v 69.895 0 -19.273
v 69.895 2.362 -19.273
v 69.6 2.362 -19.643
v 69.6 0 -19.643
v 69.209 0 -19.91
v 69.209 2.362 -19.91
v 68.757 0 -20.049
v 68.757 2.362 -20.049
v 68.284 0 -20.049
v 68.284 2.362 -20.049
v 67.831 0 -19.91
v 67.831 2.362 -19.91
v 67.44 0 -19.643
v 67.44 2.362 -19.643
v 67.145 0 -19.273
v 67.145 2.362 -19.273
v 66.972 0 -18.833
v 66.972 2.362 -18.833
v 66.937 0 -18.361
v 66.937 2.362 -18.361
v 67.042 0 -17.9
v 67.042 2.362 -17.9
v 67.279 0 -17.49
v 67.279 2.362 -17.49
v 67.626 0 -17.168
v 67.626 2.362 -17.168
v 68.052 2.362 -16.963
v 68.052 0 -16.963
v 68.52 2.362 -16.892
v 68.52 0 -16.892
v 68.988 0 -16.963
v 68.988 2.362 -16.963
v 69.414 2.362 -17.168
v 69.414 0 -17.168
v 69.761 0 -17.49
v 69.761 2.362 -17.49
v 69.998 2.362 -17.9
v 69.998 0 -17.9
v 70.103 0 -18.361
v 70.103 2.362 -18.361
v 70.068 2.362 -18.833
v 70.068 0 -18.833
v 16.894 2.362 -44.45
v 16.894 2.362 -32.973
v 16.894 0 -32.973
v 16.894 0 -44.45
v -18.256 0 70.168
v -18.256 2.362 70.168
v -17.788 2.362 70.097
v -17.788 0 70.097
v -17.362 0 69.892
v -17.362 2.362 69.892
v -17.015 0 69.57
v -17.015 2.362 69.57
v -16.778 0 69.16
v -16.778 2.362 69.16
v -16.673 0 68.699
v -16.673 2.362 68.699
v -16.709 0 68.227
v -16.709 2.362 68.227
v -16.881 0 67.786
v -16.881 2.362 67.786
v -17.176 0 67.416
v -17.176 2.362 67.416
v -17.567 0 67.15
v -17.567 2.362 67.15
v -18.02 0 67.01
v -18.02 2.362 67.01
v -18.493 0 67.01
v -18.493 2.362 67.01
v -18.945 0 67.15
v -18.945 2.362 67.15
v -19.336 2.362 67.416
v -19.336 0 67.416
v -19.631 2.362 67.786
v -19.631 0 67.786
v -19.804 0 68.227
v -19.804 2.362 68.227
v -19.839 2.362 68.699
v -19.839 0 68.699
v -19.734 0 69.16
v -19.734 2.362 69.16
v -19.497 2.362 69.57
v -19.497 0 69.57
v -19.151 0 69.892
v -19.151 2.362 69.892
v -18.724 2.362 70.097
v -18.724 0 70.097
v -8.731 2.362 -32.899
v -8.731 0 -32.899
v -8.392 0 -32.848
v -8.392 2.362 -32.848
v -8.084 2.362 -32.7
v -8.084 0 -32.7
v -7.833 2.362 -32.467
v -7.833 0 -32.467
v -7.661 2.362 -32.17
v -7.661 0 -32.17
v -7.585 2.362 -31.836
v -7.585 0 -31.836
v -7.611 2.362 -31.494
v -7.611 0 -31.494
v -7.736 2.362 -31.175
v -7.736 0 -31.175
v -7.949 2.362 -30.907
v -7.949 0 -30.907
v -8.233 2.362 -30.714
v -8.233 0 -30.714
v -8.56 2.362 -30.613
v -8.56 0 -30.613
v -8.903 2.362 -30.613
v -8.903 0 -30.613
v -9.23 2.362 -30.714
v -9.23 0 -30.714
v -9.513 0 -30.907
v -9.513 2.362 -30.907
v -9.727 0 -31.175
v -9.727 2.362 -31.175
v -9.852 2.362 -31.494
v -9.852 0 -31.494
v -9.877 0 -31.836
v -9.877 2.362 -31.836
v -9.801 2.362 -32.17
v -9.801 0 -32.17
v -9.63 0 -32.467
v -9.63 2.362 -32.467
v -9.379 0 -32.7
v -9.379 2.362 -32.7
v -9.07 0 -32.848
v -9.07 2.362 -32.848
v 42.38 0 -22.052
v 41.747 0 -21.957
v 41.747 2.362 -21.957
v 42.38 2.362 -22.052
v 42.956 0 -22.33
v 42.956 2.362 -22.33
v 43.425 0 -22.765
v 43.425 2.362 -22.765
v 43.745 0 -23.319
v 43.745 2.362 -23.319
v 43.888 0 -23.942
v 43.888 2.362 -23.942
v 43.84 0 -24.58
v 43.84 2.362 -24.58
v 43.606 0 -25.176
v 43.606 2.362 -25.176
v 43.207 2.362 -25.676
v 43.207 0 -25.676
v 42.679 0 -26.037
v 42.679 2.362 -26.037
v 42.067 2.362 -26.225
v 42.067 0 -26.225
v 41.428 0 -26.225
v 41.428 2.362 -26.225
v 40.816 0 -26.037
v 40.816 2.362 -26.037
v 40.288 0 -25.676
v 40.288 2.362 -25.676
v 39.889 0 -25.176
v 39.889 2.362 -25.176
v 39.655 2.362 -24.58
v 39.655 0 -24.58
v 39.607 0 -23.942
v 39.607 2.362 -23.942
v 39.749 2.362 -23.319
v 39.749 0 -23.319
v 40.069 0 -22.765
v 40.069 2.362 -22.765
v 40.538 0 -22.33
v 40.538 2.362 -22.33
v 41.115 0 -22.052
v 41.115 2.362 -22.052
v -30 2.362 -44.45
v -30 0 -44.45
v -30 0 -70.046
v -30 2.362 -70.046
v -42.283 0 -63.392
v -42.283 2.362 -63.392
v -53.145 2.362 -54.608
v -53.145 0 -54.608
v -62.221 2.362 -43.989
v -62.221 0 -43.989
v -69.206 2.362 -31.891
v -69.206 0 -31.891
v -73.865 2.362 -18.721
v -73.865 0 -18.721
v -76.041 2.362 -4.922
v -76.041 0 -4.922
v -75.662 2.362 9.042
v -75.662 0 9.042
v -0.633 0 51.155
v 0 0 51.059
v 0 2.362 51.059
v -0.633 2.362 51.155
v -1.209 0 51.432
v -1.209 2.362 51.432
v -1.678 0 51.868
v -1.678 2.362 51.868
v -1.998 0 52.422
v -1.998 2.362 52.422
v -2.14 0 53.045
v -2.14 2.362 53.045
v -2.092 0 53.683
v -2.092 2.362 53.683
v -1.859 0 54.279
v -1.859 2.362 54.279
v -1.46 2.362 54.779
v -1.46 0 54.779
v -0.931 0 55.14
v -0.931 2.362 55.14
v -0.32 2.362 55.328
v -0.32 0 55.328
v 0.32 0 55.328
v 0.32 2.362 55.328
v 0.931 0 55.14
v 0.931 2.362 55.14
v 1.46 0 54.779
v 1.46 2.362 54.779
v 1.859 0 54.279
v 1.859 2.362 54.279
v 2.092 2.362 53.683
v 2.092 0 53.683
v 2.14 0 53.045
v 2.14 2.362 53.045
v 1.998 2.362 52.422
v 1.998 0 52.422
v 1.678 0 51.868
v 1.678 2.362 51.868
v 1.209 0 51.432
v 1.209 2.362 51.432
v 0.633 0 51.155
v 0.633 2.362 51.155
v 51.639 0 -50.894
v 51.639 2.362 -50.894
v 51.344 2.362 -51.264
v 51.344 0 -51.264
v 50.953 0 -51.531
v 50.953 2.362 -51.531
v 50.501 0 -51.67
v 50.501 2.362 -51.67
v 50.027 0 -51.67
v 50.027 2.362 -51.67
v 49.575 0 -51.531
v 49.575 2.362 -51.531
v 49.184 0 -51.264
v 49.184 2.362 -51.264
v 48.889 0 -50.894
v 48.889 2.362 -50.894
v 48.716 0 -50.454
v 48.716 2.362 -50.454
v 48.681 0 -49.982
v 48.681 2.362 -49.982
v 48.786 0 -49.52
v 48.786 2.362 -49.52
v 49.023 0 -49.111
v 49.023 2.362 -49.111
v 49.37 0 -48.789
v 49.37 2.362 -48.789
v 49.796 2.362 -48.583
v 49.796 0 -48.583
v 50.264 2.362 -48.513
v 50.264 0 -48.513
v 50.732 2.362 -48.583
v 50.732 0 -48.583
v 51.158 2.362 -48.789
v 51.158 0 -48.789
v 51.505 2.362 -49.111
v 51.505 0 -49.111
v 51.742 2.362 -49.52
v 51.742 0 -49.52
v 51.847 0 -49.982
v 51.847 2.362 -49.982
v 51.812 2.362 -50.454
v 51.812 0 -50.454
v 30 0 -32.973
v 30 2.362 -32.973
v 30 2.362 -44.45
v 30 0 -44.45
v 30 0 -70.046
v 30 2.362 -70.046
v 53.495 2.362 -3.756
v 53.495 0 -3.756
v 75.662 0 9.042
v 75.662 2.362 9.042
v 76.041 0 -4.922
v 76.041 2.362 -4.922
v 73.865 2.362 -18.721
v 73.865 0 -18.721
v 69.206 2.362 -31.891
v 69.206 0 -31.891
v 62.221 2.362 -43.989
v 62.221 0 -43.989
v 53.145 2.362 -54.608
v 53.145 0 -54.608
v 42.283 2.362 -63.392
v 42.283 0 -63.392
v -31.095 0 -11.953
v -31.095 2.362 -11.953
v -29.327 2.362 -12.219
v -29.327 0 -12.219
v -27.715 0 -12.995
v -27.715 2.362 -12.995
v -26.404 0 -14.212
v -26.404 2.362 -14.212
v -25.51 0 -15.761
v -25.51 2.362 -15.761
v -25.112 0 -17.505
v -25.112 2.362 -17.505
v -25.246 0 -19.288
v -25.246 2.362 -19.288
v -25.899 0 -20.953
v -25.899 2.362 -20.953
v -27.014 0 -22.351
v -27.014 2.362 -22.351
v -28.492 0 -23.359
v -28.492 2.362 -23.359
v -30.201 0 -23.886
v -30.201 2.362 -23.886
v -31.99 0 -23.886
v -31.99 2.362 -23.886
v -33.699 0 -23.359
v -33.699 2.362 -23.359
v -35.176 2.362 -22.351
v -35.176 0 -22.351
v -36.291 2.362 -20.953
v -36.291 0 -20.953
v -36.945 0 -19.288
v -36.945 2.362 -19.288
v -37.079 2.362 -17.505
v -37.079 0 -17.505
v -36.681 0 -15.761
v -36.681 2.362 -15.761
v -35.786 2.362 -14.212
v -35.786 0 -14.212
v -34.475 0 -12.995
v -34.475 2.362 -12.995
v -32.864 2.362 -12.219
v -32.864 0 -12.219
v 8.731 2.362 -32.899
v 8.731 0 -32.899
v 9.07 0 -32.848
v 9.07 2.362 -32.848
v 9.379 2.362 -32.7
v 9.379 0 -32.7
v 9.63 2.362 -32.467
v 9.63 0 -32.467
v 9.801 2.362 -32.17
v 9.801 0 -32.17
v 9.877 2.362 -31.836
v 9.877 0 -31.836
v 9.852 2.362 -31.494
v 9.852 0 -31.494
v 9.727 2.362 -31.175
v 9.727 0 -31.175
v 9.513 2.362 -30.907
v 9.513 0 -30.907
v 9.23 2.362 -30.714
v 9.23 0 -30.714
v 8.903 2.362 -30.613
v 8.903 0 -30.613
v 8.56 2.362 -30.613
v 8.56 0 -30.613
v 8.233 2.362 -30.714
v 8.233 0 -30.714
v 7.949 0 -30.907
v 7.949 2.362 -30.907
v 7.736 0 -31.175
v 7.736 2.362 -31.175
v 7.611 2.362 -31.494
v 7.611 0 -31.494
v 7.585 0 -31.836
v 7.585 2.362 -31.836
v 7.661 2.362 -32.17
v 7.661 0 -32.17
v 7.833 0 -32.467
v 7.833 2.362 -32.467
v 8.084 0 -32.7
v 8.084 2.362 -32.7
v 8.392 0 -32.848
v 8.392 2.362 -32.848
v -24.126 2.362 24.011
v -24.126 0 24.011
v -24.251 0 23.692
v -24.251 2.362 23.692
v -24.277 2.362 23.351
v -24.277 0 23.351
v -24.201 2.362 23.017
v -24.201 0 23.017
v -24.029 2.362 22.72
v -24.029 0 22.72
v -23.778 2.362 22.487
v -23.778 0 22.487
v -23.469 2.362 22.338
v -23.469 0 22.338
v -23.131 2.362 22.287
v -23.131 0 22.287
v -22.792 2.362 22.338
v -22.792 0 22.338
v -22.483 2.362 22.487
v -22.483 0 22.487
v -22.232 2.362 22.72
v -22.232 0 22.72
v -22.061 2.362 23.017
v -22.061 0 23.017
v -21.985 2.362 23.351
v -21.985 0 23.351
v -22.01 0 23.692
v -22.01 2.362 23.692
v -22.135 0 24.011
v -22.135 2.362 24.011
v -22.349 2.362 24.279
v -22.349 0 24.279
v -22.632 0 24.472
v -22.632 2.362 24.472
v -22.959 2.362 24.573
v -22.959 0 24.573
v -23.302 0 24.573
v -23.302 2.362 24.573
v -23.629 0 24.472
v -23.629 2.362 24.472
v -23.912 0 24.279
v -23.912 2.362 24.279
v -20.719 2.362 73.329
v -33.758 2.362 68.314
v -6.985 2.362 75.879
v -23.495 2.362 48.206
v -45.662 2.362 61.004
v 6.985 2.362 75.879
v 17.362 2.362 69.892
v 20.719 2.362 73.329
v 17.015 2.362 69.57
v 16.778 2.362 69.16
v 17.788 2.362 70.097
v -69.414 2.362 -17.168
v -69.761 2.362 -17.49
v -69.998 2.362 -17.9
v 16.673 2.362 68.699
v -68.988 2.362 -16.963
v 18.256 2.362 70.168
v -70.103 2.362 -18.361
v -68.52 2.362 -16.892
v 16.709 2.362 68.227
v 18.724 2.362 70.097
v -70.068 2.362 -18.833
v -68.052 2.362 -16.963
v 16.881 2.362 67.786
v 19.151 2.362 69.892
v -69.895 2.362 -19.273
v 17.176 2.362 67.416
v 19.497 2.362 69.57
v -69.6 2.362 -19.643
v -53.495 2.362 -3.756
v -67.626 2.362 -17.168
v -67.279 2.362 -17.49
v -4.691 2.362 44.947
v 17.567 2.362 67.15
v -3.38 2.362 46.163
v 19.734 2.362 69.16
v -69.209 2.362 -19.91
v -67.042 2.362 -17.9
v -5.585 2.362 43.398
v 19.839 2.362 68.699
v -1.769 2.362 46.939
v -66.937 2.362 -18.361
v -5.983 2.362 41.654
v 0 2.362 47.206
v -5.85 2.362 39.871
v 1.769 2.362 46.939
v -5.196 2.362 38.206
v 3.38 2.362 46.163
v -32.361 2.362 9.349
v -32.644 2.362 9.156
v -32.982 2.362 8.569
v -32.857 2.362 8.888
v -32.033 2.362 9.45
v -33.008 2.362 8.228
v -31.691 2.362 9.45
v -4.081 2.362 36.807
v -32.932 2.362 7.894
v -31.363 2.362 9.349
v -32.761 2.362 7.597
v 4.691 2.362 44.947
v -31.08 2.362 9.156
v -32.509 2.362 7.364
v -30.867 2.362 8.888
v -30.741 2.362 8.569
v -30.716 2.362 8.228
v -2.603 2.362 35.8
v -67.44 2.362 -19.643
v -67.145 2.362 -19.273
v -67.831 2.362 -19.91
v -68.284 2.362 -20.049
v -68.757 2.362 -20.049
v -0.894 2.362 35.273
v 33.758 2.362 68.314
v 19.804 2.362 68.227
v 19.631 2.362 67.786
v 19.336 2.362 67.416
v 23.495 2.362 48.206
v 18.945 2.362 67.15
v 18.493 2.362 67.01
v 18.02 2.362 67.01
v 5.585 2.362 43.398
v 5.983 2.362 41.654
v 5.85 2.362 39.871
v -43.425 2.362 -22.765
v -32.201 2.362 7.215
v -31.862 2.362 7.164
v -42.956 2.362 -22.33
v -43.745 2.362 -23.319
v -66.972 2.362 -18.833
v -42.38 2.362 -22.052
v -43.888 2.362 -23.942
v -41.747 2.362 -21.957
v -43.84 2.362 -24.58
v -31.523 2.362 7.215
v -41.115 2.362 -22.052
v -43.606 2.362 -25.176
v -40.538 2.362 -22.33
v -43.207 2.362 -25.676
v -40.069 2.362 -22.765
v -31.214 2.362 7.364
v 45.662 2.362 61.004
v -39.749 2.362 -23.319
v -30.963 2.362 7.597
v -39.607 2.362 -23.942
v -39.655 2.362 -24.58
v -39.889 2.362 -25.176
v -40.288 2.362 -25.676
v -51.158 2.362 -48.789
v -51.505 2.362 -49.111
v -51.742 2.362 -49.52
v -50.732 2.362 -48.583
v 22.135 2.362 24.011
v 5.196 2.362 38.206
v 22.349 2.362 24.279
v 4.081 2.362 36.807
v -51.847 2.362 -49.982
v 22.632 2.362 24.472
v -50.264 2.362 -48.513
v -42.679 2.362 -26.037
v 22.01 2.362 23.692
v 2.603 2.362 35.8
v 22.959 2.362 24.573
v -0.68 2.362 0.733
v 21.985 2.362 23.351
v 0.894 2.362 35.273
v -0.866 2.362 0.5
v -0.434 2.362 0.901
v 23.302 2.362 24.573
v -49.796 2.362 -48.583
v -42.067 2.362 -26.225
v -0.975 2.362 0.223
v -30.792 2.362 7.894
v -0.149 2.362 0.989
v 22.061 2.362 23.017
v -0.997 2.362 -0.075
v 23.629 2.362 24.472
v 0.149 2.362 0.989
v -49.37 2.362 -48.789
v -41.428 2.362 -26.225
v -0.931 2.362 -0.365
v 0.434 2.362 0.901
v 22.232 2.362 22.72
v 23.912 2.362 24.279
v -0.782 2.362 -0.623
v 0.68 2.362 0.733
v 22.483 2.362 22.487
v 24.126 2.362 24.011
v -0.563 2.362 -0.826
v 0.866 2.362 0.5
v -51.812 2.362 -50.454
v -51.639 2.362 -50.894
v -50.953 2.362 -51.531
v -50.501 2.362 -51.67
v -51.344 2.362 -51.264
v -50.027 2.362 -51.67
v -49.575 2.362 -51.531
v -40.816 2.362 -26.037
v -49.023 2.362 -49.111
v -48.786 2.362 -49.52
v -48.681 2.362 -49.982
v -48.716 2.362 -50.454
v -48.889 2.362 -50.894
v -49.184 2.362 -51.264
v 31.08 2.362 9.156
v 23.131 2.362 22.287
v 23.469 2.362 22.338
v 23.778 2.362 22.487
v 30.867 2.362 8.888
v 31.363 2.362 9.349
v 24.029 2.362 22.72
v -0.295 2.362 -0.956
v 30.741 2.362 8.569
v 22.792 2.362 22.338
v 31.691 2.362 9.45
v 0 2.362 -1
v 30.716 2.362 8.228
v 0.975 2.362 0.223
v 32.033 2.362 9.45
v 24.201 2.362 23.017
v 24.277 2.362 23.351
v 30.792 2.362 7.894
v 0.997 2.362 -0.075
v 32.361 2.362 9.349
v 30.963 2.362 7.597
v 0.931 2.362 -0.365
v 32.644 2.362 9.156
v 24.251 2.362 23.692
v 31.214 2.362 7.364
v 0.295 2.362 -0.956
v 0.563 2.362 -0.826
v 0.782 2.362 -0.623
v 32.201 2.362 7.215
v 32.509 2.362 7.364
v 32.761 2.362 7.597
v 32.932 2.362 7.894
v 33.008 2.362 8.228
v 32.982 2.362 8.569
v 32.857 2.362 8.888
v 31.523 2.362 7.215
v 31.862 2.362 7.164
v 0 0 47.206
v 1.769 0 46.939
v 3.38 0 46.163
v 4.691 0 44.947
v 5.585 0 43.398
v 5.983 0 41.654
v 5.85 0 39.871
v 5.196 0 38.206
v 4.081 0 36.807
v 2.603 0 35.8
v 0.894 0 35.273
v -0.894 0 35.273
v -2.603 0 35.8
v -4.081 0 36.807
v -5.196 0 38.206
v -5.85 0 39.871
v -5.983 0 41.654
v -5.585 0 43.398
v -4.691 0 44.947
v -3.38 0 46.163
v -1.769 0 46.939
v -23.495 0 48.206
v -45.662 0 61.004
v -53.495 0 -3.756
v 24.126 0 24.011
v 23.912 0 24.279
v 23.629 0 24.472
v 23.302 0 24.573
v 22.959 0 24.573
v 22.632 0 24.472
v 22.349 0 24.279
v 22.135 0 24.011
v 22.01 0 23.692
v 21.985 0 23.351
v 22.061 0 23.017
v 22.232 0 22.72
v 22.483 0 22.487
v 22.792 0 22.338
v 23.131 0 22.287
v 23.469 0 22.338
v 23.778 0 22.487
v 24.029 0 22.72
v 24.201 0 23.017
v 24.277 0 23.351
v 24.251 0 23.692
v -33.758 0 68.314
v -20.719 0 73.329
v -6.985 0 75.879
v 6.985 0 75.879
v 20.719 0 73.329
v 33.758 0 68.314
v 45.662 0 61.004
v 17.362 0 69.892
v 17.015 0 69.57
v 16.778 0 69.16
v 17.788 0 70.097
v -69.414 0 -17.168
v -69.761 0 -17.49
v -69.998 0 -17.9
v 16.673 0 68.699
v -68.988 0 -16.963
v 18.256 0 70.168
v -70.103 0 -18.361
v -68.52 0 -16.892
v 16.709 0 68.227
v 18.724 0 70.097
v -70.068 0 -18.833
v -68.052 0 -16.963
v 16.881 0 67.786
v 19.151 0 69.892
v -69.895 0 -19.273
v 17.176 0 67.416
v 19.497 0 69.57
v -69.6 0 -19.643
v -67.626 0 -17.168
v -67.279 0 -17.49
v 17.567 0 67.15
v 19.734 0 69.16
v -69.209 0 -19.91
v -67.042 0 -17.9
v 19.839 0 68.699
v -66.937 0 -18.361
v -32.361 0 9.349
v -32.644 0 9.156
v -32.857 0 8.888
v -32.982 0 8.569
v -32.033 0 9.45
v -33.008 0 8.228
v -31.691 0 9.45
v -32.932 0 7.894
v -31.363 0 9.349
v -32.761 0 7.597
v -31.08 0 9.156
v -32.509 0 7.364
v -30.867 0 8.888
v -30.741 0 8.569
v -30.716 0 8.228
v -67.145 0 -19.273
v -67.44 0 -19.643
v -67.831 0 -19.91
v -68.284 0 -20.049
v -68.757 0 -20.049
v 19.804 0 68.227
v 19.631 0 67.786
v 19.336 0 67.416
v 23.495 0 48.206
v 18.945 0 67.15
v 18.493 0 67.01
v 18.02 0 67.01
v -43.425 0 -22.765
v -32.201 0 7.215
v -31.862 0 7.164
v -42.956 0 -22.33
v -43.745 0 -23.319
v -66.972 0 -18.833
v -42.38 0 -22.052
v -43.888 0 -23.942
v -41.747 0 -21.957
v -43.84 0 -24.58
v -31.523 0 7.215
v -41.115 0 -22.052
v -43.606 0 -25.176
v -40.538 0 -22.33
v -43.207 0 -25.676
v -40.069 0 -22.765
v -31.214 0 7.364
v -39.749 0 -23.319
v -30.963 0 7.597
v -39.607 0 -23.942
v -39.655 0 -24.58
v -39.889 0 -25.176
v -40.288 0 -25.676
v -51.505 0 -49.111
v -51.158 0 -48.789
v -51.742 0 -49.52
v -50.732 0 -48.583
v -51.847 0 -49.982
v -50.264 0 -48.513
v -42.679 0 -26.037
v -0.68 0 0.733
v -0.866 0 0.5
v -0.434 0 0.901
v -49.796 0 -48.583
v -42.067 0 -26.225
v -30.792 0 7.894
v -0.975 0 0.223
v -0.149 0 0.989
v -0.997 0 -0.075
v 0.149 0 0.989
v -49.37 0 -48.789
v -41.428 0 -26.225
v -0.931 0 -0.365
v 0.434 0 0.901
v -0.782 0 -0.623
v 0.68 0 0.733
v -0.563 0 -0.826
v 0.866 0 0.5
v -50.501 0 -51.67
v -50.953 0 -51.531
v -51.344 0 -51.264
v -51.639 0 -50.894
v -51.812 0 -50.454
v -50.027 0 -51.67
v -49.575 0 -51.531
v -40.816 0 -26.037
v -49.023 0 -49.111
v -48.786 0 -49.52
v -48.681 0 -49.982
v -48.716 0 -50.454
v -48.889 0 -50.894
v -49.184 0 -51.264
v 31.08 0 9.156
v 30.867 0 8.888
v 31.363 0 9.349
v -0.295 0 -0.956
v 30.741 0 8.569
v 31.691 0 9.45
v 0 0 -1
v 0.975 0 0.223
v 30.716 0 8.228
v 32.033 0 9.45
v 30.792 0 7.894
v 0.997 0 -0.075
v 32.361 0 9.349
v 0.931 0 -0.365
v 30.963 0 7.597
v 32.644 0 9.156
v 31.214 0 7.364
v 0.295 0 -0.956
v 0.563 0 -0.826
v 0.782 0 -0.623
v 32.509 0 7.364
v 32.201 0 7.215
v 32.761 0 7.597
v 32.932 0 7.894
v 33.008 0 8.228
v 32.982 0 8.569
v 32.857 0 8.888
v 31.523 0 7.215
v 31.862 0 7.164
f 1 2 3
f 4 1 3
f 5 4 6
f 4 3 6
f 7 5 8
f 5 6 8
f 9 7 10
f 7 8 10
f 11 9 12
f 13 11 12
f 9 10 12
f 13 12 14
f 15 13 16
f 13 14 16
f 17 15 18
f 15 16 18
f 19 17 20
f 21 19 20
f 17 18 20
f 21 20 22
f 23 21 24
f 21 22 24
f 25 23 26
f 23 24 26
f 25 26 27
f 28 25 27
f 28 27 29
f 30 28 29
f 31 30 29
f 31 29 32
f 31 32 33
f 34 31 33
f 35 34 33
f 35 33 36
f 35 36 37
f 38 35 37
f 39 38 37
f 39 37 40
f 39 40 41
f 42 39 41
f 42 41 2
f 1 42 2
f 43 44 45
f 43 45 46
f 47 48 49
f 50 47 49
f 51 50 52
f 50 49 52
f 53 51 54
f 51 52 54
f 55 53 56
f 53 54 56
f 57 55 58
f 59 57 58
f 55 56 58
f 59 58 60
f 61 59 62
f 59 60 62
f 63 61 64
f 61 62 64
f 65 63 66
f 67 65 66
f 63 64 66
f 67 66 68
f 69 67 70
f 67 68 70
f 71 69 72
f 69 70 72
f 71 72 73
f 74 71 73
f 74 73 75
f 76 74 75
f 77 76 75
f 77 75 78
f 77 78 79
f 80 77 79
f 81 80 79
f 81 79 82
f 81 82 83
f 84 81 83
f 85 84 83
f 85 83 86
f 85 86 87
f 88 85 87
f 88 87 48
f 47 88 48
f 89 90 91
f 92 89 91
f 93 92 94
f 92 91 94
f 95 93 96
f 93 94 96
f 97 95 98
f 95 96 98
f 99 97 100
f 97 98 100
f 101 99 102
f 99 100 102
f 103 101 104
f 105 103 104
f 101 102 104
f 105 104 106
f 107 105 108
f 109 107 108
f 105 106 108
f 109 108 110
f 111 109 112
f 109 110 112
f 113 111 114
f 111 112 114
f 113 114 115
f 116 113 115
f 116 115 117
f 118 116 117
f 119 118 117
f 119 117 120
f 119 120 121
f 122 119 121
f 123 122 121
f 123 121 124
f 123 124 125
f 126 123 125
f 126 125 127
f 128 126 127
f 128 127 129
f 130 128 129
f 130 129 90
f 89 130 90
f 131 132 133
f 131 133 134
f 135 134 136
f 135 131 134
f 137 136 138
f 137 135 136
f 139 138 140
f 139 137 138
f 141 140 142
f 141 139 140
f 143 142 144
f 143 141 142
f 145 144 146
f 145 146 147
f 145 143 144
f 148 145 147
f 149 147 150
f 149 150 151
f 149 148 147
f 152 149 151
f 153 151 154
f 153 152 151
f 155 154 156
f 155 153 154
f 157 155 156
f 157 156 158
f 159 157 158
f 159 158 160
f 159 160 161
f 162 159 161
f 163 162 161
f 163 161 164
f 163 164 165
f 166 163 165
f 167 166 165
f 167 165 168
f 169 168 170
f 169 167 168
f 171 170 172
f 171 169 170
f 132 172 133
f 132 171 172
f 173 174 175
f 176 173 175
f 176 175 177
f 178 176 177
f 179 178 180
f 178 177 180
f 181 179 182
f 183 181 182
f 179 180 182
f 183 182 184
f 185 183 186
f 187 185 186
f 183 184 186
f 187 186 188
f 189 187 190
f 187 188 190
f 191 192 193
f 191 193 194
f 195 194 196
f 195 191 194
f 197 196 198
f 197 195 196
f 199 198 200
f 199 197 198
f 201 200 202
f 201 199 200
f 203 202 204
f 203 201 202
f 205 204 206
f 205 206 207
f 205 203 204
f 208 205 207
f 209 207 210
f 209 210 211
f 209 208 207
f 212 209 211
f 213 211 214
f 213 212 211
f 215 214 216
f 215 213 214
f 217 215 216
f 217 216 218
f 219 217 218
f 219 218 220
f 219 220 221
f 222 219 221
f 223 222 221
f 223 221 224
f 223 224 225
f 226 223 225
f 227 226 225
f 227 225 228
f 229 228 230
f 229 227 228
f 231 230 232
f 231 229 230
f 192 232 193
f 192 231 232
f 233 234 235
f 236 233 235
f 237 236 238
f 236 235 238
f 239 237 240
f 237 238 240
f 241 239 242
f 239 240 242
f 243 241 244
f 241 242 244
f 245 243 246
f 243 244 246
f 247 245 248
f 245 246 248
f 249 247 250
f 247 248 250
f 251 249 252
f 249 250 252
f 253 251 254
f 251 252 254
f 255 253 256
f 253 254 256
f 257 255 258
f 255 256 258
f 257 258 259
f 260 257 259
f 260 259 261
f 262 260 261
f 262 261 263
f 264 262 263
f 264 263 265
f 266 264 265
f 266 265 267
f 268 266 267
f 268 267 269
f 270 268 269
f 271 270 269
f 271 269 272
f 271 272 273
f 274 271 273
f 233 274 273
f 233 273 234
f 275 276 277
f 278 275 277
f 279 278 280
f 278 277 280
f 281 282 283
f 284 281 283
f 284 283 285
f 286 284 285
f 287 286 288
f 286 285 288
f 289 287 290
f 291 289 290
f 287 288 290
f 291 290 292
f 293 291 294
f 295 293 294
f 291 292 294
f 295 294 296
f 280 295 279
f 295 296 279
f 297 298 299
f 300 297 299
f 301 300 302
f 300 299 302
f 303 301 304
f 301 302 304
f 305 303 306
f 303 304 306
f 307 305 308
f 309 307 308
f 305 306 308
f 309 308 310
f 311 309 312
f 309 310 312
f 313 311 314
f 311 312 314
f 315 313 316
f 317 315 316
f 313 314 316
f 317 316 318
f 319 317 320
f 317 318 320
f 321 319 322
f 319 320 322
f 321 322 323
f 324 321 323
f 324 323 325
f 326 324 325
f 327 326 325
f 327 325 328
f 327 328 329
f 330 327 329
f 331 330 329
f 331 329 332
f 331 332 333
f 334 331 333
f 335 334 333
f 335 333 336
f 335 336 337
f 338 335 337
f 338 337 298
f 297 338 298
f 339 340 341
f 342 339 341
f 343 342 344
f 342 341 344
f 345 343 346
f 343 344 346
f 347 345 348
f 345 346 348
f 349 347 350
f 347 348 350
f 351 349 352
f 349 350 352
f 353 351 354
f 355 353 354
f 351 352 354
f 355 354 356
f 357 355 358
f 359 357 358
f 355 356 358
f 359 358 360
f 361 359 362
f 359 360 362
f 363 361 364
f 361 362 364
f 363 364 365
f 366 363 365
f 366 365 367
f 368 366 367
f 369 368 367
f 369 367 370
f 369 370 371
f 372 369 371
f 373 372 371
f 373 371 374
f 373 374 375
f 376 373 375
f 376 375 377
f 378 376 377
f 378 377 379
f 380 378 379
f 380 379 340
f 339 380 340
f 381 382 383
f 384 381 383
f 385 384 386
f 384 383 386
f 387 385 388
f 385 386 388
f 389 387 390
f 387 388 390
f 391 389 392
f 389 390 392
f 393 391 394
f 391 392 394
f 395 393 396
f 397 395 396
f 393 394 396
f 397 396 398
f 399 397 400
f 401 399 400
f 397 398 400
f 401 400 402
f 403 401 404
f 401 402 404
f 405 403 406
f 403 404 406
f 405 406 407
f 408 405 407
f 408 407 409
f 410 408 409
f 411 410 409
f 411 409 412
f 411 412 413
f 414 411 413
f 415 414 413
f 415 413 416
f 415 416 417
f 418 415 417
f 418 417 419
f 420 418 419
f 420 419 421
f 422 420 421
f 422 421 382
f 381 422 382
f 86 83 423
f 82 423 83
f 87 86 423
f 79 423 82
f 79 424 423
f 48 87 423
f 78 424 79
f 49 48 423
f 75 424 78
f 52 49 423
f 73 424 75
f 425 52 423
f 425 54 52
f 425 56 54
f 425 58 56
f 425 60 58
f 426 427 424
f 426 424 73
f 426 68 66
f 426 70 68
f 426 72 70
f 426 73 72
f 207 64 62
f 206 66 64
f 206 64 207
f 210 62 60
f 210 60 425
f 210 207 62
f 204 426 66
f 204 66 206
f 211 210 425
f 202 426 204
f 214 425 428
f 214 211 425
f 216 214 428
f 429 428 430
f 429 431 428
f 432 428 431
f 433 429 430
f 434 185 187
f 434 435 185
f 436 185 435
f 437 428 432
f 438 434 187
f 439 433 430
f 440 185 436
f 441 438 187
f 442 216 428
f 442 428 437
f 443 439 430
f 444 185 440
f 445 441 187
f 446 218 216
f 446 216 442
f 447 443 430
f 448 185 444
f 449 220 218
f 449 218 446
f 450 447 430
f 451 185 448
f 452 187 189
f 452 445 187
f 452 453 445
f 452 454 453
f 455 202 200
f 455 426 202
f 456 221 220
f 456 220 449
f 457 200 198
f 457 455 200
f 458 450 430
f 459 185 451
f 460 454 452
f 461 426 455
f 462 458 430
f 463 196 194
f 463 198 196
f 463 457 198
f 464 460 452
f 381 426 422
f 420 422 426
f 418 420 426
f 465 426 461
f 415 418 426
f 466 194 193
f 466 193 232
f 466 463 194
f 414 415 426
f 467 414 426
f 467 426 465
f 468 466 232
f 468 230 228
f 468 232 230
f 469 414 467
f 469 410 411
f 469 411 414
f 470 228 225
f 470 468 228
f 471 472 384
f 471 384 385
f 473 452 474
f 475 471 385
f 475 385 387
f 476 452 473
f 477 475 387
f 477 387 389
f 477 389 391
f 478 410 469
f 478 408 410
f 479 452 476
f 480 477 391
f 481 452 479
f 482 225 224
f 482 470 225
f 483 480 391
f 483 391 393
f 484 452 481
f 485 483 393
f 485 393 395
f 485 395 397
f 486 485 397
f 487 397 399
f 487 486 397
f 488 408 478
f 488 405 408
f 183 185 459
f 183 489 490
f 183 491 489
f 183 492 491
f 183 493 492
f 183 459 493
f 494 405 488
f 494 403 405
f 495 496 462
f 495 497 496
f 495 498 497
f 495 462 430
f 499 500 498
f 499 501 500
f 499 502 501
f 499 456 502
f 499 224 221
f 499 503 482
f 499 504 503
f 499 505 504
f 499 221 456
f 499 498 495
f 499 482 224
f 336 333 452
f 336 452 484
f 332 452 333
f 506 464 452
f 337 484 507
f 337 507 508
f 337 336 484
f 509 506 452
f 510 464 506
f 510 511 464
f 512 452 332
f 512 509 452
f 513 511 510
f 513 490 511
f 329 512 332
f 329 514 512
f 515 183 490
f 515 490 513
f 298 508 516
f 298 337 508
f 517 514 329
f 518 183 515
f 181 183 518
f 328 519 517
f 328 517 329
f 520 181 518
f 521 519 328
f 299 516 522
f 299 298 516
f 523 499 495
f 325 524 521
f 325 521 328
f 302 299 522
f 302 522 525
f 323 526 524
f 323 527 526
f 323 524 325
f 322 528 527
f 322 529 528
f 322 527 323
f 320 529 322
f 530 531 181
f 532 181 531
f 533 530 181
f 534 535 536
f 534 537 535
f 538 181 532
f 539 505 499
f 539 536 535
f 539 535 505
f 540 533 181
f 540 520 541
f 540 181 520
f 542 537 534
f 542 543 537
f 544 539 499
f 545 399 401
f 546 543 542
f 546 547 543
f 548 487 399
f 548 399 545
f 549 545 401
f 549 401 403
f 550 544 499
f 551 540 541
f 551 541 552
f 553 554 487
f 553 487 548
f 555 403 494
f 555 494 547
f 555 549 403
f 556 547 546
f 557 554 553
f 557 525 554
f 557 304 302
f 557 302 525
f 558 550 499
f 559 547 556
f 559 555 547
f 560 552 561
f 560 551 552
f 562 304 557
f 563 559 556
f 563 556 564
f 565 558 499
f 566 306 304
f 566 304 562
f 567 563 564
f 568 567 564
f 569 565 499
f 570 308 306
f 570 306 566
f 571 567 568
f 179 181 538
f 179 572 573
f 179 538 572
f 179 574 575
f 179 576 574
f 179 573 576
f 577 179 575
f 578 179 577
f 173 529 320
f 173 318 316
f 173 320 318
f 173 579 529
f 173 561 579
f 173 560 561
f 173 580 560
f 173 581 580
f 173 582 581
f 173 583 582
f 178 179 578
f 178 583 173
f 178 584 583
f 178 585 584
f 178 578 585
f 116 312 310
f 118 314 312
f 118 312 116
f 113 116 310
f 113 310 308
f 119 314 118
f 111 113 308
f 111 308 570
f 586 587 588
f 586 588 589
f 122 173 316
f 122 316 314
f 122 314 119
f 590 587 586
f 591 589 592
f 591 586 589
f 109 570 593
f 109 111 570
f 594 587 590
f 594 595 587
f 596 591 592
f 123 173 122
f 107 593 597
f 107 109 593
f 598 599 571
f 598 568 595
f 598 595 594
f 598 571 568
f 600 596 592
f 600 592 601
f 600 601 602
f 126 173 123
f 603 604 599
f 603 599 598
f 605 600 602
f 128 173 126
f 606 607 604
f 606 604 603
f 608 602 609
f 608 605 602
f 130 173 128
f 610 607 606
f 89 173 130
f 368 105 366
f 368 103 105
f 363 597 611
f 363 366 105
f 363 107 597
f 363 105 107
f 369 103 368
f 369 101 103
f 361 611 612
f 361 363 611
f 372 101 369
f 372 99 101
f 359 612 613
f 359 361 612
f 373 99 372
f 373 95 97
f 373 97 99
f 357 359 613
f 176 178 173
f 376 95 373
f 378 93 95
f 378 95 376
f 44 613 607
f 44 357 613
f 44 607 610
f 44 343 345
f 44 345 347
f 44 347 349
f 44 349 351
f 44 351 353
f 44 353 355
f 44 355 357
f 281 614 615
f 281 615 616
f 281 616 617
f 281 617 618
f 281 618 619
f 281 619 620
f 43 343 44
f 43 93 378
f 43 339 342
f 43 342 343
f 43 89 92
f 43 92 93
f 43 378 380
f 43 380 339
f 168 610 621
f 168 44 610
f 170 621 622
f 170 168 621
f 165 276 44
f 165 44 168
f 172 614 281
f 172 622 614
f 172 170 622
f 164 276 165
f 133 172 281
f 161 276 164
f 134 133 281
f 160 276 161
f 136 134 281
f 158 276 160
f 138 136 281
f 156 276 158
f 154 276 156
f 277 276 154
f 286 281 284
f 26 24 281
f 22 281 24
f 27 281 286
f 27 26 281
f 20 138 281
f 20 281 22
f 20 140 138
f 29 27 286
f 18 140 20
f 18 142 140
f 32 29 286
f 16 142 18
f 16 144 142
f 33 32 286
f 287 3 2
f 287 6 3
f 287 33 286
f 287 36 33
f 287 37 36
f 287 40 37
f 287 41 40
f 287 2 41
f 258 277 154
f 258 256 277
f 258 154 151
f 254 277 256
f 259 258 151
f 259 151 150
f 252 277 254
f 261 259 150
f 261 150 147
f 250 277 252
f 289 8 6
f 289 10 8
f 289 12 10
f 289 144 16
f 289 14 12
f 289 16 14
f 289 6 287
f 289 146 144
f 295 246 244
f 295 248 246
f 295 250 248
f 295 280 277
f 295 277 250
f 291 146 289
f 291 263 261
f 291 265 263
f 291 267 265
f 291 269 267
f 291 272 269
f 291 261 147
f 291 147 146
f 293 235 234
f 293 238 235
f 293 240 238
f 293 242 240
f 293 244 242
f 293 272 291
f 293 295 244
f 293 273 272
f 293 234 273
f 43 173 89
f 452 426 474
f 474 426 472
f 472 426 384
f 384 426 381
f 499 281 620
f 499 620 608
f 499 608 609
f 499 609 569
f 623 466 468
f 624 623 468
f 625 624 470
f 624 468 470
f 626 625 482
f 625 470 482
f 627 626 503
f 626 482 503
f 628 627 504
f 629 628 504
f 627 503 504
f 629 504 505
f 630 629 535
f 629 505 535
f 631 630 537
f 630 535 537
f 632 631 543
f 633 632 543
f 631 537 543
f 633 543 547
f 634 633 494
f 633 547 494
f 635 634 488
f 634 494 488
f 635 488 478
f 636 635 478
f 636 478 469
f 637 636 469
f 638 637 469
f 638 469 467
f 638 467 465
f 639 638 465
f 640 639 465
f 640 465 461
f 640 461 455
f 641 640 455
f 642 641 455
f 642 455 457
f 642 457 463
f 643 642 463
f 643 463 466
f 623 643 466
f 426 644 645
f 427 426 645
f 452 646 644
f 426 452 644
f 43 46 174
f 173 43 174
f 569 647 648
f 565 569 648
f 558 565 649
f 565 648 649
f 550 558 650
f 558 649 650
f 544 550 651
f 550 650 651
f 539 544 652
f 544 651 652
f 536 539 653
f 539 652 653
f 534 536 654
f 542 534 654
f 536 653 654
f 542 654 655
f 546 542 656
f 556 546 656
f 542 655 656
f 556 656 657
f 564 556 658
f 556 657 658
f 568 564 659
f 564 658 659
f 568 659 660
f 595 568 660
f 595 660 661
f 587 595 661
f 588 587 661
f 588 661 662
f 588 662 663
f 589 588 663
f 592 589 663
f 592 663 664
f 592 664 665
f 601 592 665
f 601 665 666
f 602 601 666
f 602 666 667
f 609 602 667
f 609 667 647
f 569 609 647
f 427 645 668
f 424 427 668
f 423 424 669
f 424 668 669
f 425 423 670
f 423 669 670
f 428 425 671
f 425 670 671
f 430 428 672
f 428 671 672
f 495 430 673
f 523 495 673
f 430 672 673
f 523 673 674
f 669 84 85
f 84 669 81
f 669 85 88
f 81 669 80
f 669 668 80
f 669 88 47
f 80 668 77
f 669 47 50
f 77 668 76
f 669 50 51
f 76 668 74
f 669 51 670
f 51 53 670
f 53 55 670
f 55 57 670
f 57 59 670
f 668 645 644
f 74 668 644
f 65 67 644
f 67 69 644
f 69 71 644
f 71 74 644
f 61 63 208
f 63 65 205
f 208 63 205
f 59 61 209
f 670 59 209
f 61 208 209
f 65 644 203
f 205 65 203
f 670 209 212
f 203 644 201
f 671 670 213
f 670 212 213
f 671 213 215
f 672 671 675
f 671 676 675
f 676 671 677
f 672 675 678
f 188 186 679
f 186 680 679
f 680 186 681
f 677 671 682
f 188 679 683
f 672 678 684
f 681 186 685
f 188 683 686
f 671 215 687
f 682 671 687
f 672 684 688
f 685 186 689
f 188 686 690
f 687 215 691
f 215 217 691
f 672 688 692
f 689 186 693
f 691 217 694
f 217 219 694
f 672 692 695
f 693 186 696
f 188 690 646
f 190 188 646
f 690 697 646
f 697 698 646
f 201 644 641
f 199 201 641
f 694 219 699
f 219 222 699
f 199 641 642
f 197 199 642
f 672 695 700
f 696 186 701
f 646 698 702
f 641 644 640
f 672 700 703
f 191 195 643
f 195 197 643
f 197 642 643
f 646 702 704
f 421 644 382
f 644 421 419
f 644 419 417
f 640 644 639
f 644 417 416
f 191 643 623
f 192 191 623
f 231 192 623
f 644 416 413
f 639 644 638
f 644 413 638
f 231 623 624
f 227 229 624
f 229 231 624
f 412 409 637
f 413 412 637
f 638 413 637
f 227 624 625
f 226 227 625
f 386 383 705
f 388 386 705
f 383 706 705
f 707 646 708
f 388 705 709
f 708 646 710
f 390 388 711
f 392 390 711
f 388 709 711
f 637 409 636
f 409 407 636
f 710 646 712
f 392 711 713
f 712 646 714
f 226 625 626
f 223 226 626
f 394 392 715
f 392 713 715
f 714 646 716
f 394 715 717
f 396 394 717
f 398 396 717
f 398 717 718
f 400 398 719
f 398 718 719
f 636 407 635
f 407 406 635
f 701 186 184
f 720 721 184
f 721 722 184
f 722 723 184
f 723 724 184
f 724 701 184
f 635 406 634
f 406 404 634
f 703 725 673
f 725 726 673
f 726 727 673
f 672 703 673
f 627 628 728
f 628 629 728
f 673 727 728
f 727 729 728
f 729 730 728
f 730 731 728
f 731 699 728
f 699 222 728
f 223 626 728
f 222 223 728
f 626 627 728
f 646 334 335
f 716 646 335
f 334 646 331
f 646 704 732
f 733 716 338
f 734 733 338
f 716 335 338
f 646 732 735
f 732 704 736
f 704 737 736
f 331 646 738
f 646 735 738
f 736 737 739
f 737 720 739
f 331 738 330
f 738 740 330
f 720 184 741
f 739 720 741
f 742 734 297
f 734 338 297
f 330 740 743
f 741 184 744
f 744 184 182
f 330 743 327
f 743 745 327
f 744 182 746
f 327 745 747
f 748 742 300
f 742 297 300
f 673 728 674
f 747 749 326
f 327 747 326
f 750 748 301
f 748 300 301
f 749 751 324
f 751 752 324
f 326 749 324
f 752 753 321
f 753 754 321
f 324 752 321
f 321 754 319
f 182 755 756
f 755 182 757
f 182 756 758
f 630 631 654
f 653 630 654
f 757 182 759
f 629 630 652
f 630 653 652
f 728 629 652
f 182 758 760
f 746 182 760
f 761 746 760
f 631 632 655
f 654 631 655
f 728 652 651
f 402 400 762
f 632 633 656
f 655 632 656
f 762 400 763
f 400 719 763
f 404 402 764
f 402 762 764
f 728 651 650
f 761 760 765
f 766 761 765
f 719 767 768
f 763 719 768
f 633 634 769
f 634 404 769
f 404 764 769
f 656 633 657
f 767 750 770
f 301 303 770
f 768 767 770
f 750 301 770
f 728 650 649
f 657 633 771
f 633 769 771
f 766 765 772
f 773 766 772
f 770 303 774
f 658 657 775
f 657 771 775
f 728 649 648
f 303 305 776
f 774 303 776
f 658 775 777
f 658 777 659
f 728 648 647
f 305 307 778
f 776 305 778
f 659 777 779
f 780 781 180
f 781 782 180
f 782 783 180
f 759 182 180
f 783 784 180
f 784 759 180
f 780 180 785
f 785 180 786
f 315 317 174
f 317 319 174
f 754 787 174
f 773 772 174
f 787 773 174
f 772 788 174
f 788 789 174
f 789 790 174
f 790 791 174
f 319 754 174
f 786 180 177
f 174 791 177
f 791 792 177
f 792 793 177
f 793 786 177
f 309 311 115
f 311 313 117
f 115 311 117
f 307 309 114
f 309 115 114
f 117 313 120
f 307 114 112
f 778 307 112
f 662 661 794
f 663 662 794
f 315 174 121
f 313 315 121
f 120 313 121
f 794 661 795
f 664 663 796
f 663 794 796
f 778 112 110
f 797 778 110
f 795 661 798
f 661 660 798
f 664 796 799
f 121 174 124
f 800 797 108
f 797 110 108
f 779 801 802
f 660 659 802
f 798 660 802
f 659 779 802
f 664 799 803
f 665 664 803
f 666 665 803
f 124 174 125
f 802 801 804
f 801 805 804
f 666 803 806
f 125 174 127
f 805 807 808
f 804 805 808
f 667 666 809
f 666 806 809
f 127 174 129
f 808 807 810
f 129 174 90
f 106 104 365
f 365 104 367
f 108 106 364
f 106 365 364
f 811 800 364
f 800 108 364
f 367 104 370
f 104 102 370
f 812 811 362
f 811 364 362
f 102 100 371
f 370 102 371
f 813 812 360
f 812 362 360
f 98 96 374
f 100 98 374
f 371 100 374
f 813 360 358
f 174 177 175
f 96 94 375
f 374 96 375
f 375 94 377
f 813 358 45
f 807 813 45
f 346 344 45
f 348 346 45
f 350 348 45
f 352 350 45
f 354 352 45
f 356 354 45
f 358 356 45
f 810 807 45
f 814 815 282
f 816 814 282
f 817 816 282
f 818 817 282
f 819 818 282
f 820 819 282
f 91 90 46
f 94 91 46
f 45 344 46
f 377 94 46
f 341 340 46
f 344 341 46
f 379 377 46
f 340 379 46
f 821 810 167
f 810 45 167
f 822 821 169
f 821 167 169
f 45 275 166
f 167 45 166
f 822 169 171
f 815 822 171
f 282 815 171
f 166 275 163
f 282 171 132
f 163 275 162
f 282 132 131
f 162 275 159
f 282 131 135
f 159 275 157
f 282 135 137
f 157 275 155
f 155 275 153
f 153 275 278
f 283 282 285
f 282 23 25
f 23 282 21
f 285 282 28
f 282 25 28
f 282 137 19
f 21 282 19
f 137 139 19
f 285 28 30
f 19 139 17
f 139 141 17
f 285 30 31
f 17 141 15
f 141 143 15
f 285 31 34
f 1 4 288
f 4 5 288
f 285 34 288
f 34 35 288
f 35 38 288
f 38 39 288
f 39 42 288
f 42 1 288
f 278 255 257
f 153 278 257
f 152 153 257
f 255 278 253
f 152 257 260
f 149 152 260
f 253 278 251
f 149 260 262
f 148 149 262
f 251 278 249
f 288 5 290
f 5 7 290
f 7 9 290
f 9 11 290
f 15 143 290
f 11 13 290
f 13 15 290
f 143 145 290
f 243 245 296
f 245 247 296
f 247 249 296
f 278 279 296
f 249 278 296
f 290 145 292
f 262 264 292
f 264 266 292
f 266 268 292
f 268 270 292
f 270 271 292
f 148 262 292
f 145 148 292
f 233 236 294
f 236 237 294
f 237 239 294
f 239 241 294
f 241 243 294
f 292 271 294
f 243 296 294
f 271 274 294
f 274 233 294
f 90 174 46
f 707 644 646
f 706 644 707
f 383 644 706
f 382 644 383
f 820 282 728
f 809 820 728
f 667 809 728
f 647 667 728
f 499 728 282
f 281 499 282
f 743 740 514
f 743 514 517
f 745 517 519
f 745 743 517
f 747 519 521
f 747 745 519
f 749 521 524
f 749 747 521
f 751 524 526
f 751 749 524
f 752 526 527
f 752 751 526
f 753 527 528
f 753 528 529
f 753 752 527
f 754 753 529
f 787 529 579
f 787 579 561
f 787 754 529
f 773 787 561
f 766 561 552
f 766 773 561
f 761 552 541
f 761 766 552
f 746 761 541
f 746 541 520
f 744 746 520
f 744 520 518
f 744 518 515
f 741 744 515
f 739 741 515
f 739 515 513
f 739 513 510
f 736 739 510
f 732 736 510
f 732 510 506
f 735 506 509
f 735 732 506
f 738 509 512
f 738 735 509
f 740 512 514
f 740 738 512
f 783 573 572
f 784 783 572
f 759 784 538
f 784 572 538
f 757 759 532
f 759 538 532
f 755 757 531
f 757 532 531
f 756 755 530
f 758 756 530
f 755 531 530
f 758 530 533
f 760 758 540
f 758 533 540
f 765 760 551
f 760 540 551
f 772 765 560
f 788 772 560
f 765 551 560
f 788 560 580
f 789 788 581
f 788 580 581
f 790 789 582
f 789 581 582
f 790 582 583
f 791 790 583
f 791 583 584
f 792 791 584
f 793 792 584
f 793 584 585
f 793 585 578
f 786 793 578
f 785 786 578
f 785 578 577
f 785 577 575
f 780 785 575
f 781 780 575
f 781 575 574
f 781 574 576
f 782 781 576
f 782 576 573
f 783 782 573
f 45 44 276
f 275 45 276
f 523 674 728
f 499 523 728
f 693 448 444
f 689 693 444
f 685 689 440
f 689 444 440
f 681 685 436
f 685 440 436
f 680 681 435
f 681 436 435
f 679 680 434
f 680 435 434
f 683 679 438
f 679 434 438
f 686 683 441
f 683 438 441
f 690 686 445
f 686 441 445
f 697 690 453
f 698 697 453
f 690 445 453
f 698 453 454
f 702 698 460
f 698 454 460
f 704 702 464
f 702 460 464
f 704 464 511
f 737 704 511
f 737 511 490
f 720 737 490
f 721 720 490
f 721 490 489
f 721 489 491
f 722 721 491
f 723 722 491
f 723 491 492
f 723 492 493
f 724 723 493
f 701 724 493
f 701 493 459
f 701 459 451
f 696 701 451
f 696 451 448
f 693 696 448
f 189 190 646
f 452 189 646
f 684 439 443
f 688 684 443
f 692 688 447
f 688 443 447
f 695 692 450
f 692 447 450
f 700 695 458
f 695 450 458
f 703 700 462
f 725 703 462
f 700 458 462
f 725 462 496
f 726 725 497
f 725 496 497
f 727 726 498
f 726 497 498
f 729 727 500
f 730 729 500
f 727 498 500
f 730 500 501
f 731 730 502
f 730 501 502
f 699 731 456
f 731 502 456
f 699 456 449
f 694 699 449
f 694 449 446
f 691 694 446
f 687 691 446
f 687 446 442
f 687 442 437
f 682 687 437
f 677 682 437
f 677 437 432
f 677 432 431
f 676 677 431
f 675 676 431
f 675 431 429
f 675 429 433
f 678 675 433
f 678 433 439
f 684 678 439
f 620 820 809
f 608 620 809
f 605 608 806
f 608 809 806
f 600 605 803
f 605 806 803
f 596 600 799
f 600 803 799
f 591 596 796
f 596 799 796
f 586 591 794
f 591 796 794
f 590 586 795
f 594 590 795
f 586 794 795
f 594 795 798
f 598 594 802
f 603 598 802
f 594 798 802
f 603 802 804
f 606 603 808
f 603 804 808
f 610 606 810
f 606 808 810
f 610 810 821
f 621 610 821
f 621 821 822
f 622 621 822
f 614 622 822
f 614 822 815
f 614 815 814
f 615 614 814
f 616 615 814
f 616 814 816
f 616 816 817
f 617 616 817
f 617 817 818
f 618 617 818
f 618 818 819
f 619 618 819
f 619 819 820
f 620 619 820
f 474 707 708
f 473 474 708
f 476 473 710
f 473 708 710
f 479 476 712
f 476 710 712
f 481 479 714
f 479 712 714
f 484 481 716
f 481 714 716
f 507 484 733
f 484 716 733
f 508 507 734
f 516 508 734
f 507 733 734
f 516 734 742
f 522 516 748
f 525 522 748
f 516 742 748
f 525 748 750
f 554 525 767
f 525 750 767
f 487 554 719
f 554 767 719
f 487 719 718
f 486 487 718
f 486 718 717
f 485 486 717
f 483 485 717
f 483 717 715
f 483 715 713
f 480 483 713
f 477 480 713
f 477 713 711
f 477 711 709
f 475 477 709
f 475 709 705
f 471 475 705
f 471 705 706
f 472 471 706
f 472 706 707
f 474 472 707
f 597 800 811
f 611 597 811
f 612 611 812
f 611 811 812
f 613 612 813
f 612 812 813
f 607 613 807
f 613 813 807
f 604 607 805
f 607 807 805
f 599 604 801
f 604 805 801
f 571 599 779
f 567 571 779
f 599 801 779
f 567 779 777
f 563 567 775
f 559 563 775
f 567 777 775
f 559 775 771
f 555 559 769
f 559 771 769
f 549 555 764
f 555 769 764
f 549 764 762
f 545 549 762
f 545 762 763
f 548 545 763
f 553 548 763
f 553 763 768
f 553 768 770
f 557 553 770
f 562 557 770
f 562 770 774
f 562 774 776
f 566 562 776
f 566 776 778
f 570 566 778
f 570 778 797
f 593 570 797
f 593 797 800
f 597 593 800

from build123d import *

# Parameters (mm, degrees)
SKETCH1_R           = 2.1463
BOSS_EXTRUDE1_DEPTH = 2.3622
SKETCH2_R           = 1.5875
CUT_EXTRUDE1_DEPTH  = 10
SKETCH4_R           = 6
SKETCH4_R_2         = 5.999999938
CUT_EXTRUDE3_DEPTH  = 10
SKETCH6_R           = 1
CUT_EXTRUDE4_DEPTH  = 10
CIRPATTERN2_COUNT   = 3
SKETCH7_R           = 1.14935
CUT_EXTRUDE5_DEPTH  = 2.54
CIRPATTERN3_COUNT   = 3
SKETCH8_W           = 13.106463283
SKETCH8_H           = 11.477303128
CUT_EXTRUDE6_DEPTH  = 2.54


with BuildPart() as part:
    # Sketch1 → Boss-Extrude1 (new body)
    with BuildSketch(Plane(origin=(0, 0, 0), x_dir=(1, 0, 0), z_dir=(0, 1, 0))):
        with BuildLine():
            Line((-30, 44.45), (-30, 70.045984896))
            ThreePointArc((-30, 70.045984896), (-65.991135768, 38.1), (-75.661602353, -9.042230334))
            Line((-75.661602353, -9.042230334), (-53.494829198, 3.755762114))
            Line((-53.494829198, 3.755762114), (-23.494829198, -48.205762114))
            Line((-23.494829198, -48.205762114), (-45.661602353, -61.003754561))
            ThreePointArc((-45.661602353, -61.003754561), (0, -76.2), (45.661602353, -61.003754561))
            Line((45.661602353, -61.003754561), (23.494829198, -48.205762114))
            Line((23.494829198, -48.205762114), (53.494829198, 3.755762114))
            Line((53.494829198, 3.755762114), (75.661602353, -9.042230334))
            ThreePointArc((75.661602353, -9.042230334), (65.991135768, 38.1), (30, 70.045984896))
            Line((30, 70.045984896), (30, 44.45))
            Line((30, 44.45), (-30, 44.45))
        make_face()
        with Locations(Location((-41.747414599, 24.102881057, 0), (0, 0, 270))):
            Circle(SKETCH1_R, mode=Mode.SUBTRACT)
        with Locations(Location((41.747414599, 24.102881057, 0), (0, 0, 270))):
            Circle(SKETCH1_R, mode=Mode.SUBTRACT)
        with Locations(Location((0, -53.205762114, 0), (0, 0, 90))):
            Circle(SKETCH1_R, mode=Mode.SUBTRACT)
    extrude(amount=BOSS_EXTRUDE1_DEPTH)

    # Sketch2 → Cut-Extrude1 (cut)
    with BuildSketch(Plane(origin=(0, 2.3622, 0), x_dir=(1, 0, 0), z_dir=(0, 1, 0))):
        with Locations(Location((18.25625, -68.58, 0), (0, 0, 270))):
            Circle(SKETCH2_R)
        with Locations(Location((-18.25625, -68.58, 0), (0, 0, 270))):
            Circle(SKETCH2_R)
    cut_extrude1 = extrude(amount=-CUT_EXTRUDE1_DEPTH, mode=Mode.SUBTRACT)

    # Sketch4 → Cut-Extrude3 (cut)
    with BuildSketch(Plane(origin=(0, 2.3622, 0), x_dir=(1, 0, 0), z_dir=(0, 1, 0))):
        with Locations(Location((0, -41.205762114, 0), (0, 0, 270))):
            Circle(SKETCH4_R)
        with Locations(Location((-31.095337868, 17.952901689, 0), (0, 0, 270))):
            Circle(SKETCH4_R_2)
    extrude(amount=-CUT_EXTRUDE3_DEPTH, mode=Mode.SUBTRACT)

    # Sketch6 → Cut-Extrude4 (cut)
    with BuildSketch(Plane.XZ):
        with Locations(Location((0, 0, 0), (0, 0, 270))):
            Circle(SKETCH6_R)
    extrude(amount=-CUT_EXTRUDE4_DEPTH, mode=Mode.SUBTRACT)

    # CirPattern2: Cut-Extrude1 ×3 about axis
    cirpattern2_axis = Axis((0, 0, 0), (0, 1, 0))
    for i in range(1, CIRPATTERN2_COUNT):
        add(cut_extrude1.rotate(cirpattern2_axis, i * 360 / CIRPATTERN2_COUNT), mode=Mode.SUBTRACT)

    # Sketch7 → Cut-Extrude5 (cut)
    with BuildSketch(Plane.XZ):
        with Locations(Location((8.73125, -31.75, 0), (0, 0, 270))):
            Circle(SKETCH7_R)
        with Locations(Location((-8.73125, -31.75, 0), (0, 0, 270))):
            Circle(SKETCH7_R)
    cut_extrude5 = extrude(amount=-CUT_EXTRUDE5_DEPTH, mode=Mode.SUBTRACT)

    # CirPattern3: Cut-Extrude5 ×3 about axis
    cirpattern3_axis = Axis((0, 0, 0), (0, 1, 0))
    for i in range(1, CIRPATTERN3_COUNT):
        add(cut_extrude5.rotate(cirpattern3_axis, i * 360 / CIRPATTERN3_COUNT), mode=Mode.SUBTRACT)

    # Sketch8 → Cut-Extrude6 (cut)
    with BuildSketch(Plane(origin=(0, 2.3622, 0), x_dir=(1, 0, 0), z_dir=(0, 1, 0))):
        with Locations((23.446768359, 38.711348436)):
            Rectangle(SKETCH8_W, SKETCH8_H)
    extrude(amount=-CUT_EXTRUDE6_DEPTH, mode=Mode.SUBTRACT)


solid = part.part
